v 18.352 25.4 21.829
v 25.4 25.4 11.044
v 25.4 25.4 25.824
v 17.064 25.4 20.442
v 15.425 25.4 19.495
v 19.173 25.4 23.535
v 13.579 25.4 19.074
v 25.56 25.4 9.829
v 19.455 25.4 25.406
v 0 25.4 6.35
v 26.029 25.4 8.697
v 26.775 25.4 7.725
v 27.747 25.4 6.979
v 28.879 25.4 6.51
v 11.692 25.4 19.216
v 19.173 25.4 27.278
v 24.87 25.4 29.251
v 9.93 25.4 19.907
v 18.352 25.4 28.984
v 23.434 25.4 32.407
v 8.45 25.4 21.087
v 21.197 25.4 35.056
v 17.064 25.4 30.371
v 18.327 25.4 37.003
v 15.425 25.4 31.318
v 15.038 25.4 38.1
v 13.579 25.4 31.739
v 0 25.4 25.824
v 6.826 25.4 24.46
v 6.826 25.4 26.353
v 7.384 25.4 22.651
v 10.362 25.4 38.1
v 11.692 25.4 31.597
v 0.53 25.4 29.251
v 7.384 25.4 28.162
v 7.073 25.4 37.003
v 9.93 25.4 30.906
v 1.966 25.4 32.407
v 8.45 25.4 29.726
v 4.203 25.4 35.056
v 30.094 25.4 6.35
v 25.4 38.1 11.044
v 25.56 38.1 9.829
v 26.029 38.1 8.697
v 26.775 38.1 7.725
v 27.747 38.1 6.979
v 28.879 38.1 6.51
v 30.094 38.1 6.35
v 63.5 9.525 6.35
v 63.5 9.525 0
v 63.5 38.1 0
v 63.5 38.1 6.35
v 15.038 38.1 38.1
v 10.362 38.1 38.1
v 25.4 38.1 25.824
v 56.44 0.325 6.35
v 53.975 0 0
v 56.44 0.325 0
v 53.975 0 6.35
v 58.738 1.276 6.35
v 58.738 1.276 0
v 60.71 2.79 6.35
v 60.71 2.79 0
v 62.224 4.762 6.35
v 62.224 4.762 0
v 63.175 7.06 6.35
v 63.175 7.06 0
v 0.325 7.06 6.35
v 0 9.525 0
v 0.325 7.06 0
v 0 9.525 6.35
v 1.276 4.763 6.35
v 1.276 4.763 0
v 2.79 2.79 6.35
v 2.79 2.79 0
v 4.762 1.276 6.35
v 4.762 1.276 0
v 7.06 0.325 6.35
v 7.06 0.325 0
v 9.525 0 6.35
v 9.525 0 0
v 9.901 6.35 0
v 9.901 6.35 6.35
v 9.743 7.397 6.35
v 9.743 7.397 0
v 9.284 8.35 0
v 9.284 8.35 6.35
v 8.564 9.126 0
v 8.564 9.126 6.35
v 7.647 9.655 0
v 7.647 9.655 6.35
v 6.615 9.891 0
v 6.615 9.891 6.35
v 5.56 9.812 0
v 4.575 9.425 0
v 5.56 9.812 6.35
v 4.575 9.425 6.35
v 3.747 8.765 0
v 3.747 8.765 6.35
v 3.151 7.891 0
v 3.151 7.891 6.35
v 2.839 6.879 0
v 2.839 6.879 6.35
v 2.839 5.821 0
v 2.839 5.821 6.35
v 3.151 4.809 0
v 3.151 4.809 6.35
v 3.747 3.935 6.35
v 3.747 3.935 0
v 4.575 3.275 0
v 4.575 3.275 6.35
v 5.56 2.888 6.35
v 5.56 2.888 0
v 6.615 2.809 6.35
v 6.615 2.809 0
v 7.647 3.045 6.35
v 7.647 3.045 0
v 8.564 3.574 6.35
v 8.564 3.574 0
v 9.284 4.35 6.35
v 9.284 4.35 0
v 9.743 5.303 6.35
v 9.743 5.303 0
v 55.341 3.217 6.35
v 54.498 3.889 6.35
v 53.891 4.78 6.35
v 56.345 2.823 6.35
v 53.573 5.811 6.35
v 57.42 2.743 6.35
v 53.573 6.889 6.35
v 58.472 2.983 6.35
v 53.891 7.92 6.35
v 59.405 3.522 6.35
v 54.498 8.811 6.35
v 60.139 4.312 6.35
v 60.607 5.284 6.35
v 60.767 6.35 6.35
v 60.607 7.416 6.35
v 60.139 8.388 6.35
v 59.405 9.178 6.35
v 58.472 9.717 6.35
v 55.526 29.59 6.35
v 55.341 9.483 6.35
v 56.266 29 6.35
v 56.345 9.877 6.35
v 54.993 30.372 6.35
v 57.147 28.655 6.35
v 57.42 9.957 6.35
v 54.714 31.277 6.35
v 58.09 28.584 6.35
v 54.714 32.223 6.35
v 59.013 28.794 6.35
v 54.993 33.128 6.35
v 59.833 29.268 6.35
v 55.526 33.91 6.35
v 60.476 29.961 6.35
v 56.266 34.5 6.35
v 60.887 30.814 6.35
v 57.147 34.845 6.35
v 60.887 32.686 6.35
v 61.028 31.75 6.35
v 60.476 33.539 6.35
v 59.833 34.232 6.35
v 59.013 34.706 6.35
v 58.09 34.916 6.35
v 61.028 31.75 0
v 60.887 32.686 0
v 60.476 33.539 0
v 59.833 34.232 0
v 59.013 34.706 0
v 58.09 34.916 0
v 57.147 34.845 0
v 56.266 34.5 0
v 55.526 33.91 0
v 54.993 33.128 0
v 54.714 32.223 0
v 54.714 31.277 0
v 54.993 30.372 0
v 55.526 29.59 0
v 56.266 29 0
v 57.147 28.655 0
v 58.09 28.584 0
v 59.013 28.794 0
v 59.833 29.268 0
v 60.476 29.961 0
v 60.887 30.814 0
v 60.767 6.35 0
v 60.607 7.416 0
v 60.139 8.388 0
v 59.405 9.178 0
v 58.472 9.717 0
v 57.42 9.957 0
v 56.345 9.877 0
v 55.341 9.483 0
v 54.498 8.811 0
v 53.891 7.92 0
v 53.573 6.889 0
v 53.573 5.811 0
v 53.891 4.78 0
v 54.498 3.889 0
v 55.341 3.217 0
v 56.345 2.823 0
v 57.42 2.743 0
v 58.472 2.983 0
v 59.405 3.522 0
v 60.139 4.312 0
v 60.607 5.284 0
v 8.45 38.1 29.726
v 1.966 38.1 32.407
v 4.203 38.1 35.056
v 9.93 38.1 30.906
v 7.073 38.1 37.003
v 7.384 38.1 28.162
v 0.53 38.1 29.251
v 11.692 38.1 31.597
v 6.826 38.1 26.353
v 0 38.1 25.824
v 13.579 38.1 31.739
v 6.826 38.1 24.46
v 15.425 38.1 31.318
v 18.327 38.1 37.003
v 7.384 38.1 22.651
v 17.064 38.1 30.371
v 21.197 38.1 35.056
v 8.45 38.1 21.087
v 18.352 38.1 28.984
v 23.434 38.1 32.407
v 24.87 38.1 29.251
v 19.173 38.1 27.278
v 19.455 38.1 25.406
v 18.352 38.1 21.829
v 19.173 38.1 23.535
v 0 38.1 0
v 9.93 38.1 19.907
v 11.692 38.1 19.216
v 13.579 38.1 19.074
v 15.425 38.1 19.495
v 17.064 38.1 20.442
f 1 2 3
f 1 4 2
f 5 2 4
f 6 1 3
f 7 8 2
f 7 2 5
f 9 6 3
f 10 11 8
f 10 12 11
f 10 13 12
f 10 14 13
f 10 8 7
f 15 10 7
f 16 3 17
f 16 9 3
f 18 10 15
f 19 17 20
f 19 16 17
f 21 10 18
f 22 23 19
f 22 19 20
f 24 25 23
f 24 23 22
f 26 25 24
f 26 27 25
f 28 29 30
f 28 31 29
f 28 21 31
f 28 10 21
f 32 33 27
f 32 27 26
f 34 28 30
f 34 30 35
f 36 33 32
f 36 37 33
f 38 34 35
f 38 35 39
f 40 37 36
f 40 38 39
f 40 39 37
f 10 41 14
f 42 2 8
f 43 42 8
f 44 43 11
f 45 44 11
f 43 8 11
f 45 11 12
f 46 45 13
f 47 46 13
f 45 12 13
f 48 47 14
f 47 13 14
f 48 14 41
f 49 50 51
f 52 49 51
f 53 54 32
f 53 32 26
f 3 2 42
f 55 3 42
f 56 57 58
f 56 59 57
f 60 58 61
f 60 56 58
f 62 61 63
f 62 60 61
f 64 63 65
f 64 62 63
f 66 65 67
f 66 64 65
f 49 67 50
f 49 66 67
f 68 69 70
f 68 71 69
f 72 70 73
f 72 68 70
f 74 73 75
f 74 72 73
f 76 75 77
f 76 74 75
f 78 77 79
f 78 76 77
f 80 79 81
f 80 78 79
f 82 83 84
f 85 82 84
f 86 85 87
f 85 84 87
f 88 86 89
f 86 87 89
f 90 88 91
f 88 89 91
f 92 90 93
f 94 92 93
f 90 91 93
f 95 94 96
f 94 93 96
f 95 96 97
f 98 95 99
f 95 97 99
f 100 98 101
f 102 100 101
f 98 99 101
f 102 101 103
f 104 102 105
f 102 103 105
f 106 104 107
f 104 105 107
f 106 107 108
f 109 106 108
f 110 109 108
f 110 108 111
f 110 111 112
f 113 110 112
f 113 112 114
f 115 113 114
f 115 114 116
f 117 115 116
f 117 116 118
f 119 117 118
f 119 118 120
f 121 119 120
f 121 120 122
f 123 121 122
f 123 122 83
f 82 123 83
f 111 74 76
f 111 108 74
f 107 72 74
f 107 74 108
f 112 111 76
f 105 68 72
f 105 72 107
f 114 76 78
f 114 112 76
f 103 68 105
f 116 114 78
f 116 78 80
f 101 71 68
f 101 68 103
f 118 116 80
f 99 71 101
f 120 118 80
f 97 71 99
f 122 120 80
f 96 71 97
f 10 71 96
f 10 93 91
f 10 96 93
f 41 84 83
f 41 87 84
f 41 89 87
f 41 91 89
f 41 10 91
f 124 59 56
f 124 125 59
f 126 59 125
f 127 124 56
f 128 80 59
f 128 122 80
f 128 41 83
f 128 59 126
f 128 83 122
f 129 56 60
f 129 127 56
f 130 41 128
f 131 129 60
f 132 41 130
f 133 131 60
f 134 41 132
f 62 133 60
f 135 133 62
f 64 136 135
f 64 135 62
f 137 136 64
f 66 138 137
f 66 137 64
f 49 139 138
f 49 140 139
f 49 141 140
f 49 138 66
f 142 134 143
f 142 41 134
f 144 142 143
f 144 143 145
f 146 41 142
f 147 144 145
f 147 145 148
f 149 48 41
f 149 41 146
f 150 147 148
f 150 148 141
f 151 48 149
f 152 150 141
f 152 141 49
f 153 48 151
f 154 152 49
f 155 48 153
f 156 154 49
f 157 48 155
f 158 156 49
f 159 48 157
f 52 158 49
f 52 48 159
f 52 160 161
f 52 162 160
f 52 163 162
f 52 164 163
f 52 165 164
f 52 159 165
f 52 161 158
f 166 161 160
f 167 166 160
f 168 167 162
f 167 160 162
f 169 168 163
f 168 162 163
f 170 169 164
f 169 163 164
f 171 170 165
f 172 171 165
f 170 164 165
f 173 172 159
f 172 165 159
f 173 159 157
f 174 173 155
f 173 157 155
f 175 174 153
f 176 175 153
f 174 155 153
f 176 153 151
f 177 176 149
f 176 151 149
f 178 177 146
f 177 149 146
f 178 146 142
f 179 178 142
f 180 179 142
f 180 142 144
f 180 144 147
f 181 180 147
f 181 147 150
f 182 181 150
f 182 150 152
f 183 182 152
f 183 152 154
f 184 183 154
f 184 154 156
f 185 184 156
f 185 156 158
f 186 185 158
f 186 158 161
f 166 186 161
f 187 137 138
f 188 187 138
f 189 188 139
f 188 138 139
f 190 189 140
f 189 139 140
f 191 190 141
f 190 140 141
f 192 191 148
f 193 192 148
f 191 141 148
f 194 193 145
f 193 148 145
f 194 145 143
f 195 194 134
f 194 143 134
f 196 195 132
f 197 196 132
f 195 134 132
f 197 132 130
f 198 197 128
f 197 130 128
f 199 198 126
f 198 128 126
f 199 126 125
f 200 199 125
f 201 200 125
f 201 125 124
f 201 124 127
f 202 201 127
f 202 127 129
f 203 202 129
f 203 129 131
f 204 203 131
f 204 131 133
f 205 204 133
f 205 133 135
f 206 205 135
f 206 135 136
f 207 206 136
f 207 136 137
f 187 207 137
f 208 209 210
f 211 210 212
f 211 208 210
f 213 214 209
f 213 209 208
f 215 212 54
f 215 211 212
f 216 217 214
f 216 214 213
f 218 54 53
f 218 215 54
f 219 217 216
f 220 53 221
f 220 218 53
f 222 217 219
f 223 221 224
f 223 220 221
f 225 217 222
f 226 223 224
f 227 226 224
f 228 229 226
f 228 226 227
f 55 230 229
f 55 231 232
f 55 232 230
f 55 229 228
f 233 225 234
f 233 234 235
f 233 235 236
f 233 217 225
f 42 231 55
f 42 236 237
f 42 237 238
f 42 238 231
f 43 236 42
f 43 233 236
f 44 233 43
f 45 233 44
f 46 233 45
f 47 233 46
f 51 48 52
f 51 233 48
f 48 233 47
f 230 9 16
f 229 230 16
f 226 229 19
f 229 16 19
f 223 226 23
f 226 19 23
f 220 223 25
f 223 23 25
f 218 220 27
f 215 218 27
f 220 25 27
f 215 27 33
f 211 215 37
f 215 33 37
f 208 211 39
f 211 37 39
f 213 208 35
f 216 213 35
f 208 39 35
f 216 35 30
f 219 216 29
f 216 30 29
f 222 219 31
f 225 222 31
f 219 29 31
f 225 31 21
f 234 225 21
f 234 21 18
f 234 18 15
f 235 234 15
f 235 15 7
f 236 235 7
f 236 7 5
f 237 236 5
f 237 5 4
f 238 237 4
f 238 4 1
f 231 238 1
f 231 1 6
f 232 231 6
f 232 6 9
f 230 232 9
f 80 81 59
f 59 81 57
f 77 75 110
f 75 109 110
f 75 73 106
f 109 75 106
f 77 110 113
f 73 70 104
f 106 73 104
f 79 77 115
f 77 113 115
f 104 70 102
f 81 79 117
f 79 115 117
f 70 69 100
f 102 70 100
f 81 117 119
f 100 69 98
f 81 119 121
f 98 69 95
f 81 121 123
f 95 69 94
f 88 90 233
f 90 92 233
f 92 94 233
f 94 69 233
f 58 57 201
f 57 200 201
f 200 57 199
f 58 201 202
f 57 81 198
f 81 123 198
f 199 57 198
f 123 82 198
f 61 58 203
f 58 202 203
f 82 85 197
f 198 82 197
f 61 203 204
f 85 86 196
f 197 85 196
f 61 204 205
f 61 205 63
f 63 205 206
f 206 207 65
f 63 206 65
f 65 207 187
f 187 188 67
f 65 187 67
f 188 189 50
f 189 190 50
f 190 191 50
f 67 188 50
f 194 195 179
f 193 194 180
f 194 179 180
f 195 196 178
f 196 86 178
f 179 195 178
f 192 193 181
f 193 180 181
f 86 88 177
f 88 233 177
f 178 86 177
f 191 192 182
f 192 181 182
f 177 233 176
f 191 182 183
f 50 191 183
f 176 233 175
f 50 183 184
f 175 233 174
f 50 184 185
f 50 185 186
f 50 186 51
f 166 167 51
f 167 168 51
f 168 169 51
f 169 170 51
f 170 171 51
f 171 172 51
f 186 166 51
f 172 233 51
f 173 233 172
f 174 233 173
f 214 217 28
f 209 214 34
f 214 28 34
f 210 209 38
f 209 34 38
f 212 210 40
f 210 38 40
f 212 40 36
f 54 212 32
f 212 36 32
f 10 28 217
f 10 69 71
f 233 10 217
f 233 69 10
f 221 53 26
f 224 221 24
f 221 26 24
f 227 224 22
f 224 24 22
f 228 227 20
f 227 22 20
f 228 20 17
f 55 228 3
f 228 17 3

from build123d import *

# Parameters (mm, degrees)
F0_W      = 63.5
F0_H      = 38.1
F1_DEPTH  = 6.35
F2_R      = 3.5505344057
F2_R_2    = 3.6174877647
F2_R_3    = 3.175
F3_DEPTH  = 25.4
F4_W      = 25.4
F4_H      = 12.7
F5_DEPTH  = 31.75
F6_R      = 6.35
F7_DEPTH  = 12.701
F8_R      = 9.525
F9_W      = 12.7
F9_H      = 9.7370275993
F10_DEPTH = 12.7
F12_DEPTH = 25.4


with BuildPart() as f1:
    # F0 (on Top) → F1 (new body)
    with BuildSketch(Plane.XY):
        with Locations((31.75, 19.05)):
            Rectangle(F0_W, F0_H)
    extrude(amount=F1_DEPTH)

    # F2 (on face) → F3 (cut)
    with BuildSketch(Plane.XY.offset(6.35)):
        with Locations((6.35, 6.35)):
            Circle(F2_R)
        with Locations((57.15, 6.35)):
            Circle(F2_R_2)
        with Locations((57.8531328631, 31.75)):
            Circle(F2_R_3)
    extrude(amount=-F3_DEPTH, mode=Mode.SUBTRACT)

    # F4 (on face) → F5 (join)
    with BuildSketch(Plane.XY.offset(6.35)):
        with Locations((12.7, 31.75)):
            Rectangle(F4_W, F4_H)
    extrude(amount=F5_DEPTH)

    # F6 (on face) → F7 (cut, through all)
    with BuildSketch(Plane.XZ.offset(-25.4)):
        with Locations((13.1049470376, 25.4064576301)):
            Circle(F6_R)
        with BuildLine():
            ThreePointArc((0, 25.8240551986), (2.9939347232, 33.8082957634), (10.3623142783, 38.1))
            Line((10.3623142783, 38.1), (0, 38.1))
            Line((0, 38.1), (0, 25.8240551986))
        make_face()
        with BuildLine():
            ThreePointArc((15.0376857217, 38.1), (22.4060652768, 33.8082957634), (25.4, 25.8240551986))
            Line((25.4, 25.8240551986), (25.4, 38.1))
            Line((25.4, 38.1), (15.0376857217, 38.1))
        make_face()
    extrude(amount=-F7_DEPTH, mode=Mode.SUBTRACT)

    # F8
    f8_edges = [f1.edges().sort_by_distance(p)[0] for p in [
        (0, 0, 3.175),
        (63.5, 0, 3.175),
    ]]
    fillet(f8_edges, radius=F8_R)

    # F9 (on face) → F10 (join)
    with BuildSketch(Plane.YZ.offset(25.4)):
        with Locations((31.75, 11.2185137997)):
            Rectangle(F9_W, F9_H)
    extrude(amount=F10_DEPTH)

    # F11 (on face) → F12 (cut)
    with BuildSketch(Plane.XZ.offset(-25.4)):
        with BuildLine():
            ThreePointArc((34.7881134803, 11.0440567401), (30.0940567401, 15.7381134803), (25.4, 11.0440567401))
            ThreePointArc((25.4, 11.0440567401), (26.7748573879, 7.7248573879), (30.0940567401, 6.35))
            ThreePointArc((30.0940567401, 6.35), (33.4132560924, 7.7248573879), (34.7881134803, 11.0440567401))
        make_face()
        with BuildLine():
            Line((38.1, 16.0870275993), (25.4, 16.0870275993))
            Line((25.4, 16.0870275993), (25.4, 11.0440567401))
            ThreePointArc((25.4, 11.0440567401), (30.0940567401, 15.7381134803), (34.7881134803, 11.0440567401))
            ThreePointArc((34.7881134803, 11.0440567401), (33.4132560924, 7.7248573879), (30.0940567401, 6.35))
            Line((30.0940567401, 6.35), (38.1, 6.35))
            Line((38.1, 6.35), (38.1, 16.0870275993))
        make_face()
    extrude(amount=-F12_DEPTH, mode=Mode.SUBTRACT)


solid = f1.part
